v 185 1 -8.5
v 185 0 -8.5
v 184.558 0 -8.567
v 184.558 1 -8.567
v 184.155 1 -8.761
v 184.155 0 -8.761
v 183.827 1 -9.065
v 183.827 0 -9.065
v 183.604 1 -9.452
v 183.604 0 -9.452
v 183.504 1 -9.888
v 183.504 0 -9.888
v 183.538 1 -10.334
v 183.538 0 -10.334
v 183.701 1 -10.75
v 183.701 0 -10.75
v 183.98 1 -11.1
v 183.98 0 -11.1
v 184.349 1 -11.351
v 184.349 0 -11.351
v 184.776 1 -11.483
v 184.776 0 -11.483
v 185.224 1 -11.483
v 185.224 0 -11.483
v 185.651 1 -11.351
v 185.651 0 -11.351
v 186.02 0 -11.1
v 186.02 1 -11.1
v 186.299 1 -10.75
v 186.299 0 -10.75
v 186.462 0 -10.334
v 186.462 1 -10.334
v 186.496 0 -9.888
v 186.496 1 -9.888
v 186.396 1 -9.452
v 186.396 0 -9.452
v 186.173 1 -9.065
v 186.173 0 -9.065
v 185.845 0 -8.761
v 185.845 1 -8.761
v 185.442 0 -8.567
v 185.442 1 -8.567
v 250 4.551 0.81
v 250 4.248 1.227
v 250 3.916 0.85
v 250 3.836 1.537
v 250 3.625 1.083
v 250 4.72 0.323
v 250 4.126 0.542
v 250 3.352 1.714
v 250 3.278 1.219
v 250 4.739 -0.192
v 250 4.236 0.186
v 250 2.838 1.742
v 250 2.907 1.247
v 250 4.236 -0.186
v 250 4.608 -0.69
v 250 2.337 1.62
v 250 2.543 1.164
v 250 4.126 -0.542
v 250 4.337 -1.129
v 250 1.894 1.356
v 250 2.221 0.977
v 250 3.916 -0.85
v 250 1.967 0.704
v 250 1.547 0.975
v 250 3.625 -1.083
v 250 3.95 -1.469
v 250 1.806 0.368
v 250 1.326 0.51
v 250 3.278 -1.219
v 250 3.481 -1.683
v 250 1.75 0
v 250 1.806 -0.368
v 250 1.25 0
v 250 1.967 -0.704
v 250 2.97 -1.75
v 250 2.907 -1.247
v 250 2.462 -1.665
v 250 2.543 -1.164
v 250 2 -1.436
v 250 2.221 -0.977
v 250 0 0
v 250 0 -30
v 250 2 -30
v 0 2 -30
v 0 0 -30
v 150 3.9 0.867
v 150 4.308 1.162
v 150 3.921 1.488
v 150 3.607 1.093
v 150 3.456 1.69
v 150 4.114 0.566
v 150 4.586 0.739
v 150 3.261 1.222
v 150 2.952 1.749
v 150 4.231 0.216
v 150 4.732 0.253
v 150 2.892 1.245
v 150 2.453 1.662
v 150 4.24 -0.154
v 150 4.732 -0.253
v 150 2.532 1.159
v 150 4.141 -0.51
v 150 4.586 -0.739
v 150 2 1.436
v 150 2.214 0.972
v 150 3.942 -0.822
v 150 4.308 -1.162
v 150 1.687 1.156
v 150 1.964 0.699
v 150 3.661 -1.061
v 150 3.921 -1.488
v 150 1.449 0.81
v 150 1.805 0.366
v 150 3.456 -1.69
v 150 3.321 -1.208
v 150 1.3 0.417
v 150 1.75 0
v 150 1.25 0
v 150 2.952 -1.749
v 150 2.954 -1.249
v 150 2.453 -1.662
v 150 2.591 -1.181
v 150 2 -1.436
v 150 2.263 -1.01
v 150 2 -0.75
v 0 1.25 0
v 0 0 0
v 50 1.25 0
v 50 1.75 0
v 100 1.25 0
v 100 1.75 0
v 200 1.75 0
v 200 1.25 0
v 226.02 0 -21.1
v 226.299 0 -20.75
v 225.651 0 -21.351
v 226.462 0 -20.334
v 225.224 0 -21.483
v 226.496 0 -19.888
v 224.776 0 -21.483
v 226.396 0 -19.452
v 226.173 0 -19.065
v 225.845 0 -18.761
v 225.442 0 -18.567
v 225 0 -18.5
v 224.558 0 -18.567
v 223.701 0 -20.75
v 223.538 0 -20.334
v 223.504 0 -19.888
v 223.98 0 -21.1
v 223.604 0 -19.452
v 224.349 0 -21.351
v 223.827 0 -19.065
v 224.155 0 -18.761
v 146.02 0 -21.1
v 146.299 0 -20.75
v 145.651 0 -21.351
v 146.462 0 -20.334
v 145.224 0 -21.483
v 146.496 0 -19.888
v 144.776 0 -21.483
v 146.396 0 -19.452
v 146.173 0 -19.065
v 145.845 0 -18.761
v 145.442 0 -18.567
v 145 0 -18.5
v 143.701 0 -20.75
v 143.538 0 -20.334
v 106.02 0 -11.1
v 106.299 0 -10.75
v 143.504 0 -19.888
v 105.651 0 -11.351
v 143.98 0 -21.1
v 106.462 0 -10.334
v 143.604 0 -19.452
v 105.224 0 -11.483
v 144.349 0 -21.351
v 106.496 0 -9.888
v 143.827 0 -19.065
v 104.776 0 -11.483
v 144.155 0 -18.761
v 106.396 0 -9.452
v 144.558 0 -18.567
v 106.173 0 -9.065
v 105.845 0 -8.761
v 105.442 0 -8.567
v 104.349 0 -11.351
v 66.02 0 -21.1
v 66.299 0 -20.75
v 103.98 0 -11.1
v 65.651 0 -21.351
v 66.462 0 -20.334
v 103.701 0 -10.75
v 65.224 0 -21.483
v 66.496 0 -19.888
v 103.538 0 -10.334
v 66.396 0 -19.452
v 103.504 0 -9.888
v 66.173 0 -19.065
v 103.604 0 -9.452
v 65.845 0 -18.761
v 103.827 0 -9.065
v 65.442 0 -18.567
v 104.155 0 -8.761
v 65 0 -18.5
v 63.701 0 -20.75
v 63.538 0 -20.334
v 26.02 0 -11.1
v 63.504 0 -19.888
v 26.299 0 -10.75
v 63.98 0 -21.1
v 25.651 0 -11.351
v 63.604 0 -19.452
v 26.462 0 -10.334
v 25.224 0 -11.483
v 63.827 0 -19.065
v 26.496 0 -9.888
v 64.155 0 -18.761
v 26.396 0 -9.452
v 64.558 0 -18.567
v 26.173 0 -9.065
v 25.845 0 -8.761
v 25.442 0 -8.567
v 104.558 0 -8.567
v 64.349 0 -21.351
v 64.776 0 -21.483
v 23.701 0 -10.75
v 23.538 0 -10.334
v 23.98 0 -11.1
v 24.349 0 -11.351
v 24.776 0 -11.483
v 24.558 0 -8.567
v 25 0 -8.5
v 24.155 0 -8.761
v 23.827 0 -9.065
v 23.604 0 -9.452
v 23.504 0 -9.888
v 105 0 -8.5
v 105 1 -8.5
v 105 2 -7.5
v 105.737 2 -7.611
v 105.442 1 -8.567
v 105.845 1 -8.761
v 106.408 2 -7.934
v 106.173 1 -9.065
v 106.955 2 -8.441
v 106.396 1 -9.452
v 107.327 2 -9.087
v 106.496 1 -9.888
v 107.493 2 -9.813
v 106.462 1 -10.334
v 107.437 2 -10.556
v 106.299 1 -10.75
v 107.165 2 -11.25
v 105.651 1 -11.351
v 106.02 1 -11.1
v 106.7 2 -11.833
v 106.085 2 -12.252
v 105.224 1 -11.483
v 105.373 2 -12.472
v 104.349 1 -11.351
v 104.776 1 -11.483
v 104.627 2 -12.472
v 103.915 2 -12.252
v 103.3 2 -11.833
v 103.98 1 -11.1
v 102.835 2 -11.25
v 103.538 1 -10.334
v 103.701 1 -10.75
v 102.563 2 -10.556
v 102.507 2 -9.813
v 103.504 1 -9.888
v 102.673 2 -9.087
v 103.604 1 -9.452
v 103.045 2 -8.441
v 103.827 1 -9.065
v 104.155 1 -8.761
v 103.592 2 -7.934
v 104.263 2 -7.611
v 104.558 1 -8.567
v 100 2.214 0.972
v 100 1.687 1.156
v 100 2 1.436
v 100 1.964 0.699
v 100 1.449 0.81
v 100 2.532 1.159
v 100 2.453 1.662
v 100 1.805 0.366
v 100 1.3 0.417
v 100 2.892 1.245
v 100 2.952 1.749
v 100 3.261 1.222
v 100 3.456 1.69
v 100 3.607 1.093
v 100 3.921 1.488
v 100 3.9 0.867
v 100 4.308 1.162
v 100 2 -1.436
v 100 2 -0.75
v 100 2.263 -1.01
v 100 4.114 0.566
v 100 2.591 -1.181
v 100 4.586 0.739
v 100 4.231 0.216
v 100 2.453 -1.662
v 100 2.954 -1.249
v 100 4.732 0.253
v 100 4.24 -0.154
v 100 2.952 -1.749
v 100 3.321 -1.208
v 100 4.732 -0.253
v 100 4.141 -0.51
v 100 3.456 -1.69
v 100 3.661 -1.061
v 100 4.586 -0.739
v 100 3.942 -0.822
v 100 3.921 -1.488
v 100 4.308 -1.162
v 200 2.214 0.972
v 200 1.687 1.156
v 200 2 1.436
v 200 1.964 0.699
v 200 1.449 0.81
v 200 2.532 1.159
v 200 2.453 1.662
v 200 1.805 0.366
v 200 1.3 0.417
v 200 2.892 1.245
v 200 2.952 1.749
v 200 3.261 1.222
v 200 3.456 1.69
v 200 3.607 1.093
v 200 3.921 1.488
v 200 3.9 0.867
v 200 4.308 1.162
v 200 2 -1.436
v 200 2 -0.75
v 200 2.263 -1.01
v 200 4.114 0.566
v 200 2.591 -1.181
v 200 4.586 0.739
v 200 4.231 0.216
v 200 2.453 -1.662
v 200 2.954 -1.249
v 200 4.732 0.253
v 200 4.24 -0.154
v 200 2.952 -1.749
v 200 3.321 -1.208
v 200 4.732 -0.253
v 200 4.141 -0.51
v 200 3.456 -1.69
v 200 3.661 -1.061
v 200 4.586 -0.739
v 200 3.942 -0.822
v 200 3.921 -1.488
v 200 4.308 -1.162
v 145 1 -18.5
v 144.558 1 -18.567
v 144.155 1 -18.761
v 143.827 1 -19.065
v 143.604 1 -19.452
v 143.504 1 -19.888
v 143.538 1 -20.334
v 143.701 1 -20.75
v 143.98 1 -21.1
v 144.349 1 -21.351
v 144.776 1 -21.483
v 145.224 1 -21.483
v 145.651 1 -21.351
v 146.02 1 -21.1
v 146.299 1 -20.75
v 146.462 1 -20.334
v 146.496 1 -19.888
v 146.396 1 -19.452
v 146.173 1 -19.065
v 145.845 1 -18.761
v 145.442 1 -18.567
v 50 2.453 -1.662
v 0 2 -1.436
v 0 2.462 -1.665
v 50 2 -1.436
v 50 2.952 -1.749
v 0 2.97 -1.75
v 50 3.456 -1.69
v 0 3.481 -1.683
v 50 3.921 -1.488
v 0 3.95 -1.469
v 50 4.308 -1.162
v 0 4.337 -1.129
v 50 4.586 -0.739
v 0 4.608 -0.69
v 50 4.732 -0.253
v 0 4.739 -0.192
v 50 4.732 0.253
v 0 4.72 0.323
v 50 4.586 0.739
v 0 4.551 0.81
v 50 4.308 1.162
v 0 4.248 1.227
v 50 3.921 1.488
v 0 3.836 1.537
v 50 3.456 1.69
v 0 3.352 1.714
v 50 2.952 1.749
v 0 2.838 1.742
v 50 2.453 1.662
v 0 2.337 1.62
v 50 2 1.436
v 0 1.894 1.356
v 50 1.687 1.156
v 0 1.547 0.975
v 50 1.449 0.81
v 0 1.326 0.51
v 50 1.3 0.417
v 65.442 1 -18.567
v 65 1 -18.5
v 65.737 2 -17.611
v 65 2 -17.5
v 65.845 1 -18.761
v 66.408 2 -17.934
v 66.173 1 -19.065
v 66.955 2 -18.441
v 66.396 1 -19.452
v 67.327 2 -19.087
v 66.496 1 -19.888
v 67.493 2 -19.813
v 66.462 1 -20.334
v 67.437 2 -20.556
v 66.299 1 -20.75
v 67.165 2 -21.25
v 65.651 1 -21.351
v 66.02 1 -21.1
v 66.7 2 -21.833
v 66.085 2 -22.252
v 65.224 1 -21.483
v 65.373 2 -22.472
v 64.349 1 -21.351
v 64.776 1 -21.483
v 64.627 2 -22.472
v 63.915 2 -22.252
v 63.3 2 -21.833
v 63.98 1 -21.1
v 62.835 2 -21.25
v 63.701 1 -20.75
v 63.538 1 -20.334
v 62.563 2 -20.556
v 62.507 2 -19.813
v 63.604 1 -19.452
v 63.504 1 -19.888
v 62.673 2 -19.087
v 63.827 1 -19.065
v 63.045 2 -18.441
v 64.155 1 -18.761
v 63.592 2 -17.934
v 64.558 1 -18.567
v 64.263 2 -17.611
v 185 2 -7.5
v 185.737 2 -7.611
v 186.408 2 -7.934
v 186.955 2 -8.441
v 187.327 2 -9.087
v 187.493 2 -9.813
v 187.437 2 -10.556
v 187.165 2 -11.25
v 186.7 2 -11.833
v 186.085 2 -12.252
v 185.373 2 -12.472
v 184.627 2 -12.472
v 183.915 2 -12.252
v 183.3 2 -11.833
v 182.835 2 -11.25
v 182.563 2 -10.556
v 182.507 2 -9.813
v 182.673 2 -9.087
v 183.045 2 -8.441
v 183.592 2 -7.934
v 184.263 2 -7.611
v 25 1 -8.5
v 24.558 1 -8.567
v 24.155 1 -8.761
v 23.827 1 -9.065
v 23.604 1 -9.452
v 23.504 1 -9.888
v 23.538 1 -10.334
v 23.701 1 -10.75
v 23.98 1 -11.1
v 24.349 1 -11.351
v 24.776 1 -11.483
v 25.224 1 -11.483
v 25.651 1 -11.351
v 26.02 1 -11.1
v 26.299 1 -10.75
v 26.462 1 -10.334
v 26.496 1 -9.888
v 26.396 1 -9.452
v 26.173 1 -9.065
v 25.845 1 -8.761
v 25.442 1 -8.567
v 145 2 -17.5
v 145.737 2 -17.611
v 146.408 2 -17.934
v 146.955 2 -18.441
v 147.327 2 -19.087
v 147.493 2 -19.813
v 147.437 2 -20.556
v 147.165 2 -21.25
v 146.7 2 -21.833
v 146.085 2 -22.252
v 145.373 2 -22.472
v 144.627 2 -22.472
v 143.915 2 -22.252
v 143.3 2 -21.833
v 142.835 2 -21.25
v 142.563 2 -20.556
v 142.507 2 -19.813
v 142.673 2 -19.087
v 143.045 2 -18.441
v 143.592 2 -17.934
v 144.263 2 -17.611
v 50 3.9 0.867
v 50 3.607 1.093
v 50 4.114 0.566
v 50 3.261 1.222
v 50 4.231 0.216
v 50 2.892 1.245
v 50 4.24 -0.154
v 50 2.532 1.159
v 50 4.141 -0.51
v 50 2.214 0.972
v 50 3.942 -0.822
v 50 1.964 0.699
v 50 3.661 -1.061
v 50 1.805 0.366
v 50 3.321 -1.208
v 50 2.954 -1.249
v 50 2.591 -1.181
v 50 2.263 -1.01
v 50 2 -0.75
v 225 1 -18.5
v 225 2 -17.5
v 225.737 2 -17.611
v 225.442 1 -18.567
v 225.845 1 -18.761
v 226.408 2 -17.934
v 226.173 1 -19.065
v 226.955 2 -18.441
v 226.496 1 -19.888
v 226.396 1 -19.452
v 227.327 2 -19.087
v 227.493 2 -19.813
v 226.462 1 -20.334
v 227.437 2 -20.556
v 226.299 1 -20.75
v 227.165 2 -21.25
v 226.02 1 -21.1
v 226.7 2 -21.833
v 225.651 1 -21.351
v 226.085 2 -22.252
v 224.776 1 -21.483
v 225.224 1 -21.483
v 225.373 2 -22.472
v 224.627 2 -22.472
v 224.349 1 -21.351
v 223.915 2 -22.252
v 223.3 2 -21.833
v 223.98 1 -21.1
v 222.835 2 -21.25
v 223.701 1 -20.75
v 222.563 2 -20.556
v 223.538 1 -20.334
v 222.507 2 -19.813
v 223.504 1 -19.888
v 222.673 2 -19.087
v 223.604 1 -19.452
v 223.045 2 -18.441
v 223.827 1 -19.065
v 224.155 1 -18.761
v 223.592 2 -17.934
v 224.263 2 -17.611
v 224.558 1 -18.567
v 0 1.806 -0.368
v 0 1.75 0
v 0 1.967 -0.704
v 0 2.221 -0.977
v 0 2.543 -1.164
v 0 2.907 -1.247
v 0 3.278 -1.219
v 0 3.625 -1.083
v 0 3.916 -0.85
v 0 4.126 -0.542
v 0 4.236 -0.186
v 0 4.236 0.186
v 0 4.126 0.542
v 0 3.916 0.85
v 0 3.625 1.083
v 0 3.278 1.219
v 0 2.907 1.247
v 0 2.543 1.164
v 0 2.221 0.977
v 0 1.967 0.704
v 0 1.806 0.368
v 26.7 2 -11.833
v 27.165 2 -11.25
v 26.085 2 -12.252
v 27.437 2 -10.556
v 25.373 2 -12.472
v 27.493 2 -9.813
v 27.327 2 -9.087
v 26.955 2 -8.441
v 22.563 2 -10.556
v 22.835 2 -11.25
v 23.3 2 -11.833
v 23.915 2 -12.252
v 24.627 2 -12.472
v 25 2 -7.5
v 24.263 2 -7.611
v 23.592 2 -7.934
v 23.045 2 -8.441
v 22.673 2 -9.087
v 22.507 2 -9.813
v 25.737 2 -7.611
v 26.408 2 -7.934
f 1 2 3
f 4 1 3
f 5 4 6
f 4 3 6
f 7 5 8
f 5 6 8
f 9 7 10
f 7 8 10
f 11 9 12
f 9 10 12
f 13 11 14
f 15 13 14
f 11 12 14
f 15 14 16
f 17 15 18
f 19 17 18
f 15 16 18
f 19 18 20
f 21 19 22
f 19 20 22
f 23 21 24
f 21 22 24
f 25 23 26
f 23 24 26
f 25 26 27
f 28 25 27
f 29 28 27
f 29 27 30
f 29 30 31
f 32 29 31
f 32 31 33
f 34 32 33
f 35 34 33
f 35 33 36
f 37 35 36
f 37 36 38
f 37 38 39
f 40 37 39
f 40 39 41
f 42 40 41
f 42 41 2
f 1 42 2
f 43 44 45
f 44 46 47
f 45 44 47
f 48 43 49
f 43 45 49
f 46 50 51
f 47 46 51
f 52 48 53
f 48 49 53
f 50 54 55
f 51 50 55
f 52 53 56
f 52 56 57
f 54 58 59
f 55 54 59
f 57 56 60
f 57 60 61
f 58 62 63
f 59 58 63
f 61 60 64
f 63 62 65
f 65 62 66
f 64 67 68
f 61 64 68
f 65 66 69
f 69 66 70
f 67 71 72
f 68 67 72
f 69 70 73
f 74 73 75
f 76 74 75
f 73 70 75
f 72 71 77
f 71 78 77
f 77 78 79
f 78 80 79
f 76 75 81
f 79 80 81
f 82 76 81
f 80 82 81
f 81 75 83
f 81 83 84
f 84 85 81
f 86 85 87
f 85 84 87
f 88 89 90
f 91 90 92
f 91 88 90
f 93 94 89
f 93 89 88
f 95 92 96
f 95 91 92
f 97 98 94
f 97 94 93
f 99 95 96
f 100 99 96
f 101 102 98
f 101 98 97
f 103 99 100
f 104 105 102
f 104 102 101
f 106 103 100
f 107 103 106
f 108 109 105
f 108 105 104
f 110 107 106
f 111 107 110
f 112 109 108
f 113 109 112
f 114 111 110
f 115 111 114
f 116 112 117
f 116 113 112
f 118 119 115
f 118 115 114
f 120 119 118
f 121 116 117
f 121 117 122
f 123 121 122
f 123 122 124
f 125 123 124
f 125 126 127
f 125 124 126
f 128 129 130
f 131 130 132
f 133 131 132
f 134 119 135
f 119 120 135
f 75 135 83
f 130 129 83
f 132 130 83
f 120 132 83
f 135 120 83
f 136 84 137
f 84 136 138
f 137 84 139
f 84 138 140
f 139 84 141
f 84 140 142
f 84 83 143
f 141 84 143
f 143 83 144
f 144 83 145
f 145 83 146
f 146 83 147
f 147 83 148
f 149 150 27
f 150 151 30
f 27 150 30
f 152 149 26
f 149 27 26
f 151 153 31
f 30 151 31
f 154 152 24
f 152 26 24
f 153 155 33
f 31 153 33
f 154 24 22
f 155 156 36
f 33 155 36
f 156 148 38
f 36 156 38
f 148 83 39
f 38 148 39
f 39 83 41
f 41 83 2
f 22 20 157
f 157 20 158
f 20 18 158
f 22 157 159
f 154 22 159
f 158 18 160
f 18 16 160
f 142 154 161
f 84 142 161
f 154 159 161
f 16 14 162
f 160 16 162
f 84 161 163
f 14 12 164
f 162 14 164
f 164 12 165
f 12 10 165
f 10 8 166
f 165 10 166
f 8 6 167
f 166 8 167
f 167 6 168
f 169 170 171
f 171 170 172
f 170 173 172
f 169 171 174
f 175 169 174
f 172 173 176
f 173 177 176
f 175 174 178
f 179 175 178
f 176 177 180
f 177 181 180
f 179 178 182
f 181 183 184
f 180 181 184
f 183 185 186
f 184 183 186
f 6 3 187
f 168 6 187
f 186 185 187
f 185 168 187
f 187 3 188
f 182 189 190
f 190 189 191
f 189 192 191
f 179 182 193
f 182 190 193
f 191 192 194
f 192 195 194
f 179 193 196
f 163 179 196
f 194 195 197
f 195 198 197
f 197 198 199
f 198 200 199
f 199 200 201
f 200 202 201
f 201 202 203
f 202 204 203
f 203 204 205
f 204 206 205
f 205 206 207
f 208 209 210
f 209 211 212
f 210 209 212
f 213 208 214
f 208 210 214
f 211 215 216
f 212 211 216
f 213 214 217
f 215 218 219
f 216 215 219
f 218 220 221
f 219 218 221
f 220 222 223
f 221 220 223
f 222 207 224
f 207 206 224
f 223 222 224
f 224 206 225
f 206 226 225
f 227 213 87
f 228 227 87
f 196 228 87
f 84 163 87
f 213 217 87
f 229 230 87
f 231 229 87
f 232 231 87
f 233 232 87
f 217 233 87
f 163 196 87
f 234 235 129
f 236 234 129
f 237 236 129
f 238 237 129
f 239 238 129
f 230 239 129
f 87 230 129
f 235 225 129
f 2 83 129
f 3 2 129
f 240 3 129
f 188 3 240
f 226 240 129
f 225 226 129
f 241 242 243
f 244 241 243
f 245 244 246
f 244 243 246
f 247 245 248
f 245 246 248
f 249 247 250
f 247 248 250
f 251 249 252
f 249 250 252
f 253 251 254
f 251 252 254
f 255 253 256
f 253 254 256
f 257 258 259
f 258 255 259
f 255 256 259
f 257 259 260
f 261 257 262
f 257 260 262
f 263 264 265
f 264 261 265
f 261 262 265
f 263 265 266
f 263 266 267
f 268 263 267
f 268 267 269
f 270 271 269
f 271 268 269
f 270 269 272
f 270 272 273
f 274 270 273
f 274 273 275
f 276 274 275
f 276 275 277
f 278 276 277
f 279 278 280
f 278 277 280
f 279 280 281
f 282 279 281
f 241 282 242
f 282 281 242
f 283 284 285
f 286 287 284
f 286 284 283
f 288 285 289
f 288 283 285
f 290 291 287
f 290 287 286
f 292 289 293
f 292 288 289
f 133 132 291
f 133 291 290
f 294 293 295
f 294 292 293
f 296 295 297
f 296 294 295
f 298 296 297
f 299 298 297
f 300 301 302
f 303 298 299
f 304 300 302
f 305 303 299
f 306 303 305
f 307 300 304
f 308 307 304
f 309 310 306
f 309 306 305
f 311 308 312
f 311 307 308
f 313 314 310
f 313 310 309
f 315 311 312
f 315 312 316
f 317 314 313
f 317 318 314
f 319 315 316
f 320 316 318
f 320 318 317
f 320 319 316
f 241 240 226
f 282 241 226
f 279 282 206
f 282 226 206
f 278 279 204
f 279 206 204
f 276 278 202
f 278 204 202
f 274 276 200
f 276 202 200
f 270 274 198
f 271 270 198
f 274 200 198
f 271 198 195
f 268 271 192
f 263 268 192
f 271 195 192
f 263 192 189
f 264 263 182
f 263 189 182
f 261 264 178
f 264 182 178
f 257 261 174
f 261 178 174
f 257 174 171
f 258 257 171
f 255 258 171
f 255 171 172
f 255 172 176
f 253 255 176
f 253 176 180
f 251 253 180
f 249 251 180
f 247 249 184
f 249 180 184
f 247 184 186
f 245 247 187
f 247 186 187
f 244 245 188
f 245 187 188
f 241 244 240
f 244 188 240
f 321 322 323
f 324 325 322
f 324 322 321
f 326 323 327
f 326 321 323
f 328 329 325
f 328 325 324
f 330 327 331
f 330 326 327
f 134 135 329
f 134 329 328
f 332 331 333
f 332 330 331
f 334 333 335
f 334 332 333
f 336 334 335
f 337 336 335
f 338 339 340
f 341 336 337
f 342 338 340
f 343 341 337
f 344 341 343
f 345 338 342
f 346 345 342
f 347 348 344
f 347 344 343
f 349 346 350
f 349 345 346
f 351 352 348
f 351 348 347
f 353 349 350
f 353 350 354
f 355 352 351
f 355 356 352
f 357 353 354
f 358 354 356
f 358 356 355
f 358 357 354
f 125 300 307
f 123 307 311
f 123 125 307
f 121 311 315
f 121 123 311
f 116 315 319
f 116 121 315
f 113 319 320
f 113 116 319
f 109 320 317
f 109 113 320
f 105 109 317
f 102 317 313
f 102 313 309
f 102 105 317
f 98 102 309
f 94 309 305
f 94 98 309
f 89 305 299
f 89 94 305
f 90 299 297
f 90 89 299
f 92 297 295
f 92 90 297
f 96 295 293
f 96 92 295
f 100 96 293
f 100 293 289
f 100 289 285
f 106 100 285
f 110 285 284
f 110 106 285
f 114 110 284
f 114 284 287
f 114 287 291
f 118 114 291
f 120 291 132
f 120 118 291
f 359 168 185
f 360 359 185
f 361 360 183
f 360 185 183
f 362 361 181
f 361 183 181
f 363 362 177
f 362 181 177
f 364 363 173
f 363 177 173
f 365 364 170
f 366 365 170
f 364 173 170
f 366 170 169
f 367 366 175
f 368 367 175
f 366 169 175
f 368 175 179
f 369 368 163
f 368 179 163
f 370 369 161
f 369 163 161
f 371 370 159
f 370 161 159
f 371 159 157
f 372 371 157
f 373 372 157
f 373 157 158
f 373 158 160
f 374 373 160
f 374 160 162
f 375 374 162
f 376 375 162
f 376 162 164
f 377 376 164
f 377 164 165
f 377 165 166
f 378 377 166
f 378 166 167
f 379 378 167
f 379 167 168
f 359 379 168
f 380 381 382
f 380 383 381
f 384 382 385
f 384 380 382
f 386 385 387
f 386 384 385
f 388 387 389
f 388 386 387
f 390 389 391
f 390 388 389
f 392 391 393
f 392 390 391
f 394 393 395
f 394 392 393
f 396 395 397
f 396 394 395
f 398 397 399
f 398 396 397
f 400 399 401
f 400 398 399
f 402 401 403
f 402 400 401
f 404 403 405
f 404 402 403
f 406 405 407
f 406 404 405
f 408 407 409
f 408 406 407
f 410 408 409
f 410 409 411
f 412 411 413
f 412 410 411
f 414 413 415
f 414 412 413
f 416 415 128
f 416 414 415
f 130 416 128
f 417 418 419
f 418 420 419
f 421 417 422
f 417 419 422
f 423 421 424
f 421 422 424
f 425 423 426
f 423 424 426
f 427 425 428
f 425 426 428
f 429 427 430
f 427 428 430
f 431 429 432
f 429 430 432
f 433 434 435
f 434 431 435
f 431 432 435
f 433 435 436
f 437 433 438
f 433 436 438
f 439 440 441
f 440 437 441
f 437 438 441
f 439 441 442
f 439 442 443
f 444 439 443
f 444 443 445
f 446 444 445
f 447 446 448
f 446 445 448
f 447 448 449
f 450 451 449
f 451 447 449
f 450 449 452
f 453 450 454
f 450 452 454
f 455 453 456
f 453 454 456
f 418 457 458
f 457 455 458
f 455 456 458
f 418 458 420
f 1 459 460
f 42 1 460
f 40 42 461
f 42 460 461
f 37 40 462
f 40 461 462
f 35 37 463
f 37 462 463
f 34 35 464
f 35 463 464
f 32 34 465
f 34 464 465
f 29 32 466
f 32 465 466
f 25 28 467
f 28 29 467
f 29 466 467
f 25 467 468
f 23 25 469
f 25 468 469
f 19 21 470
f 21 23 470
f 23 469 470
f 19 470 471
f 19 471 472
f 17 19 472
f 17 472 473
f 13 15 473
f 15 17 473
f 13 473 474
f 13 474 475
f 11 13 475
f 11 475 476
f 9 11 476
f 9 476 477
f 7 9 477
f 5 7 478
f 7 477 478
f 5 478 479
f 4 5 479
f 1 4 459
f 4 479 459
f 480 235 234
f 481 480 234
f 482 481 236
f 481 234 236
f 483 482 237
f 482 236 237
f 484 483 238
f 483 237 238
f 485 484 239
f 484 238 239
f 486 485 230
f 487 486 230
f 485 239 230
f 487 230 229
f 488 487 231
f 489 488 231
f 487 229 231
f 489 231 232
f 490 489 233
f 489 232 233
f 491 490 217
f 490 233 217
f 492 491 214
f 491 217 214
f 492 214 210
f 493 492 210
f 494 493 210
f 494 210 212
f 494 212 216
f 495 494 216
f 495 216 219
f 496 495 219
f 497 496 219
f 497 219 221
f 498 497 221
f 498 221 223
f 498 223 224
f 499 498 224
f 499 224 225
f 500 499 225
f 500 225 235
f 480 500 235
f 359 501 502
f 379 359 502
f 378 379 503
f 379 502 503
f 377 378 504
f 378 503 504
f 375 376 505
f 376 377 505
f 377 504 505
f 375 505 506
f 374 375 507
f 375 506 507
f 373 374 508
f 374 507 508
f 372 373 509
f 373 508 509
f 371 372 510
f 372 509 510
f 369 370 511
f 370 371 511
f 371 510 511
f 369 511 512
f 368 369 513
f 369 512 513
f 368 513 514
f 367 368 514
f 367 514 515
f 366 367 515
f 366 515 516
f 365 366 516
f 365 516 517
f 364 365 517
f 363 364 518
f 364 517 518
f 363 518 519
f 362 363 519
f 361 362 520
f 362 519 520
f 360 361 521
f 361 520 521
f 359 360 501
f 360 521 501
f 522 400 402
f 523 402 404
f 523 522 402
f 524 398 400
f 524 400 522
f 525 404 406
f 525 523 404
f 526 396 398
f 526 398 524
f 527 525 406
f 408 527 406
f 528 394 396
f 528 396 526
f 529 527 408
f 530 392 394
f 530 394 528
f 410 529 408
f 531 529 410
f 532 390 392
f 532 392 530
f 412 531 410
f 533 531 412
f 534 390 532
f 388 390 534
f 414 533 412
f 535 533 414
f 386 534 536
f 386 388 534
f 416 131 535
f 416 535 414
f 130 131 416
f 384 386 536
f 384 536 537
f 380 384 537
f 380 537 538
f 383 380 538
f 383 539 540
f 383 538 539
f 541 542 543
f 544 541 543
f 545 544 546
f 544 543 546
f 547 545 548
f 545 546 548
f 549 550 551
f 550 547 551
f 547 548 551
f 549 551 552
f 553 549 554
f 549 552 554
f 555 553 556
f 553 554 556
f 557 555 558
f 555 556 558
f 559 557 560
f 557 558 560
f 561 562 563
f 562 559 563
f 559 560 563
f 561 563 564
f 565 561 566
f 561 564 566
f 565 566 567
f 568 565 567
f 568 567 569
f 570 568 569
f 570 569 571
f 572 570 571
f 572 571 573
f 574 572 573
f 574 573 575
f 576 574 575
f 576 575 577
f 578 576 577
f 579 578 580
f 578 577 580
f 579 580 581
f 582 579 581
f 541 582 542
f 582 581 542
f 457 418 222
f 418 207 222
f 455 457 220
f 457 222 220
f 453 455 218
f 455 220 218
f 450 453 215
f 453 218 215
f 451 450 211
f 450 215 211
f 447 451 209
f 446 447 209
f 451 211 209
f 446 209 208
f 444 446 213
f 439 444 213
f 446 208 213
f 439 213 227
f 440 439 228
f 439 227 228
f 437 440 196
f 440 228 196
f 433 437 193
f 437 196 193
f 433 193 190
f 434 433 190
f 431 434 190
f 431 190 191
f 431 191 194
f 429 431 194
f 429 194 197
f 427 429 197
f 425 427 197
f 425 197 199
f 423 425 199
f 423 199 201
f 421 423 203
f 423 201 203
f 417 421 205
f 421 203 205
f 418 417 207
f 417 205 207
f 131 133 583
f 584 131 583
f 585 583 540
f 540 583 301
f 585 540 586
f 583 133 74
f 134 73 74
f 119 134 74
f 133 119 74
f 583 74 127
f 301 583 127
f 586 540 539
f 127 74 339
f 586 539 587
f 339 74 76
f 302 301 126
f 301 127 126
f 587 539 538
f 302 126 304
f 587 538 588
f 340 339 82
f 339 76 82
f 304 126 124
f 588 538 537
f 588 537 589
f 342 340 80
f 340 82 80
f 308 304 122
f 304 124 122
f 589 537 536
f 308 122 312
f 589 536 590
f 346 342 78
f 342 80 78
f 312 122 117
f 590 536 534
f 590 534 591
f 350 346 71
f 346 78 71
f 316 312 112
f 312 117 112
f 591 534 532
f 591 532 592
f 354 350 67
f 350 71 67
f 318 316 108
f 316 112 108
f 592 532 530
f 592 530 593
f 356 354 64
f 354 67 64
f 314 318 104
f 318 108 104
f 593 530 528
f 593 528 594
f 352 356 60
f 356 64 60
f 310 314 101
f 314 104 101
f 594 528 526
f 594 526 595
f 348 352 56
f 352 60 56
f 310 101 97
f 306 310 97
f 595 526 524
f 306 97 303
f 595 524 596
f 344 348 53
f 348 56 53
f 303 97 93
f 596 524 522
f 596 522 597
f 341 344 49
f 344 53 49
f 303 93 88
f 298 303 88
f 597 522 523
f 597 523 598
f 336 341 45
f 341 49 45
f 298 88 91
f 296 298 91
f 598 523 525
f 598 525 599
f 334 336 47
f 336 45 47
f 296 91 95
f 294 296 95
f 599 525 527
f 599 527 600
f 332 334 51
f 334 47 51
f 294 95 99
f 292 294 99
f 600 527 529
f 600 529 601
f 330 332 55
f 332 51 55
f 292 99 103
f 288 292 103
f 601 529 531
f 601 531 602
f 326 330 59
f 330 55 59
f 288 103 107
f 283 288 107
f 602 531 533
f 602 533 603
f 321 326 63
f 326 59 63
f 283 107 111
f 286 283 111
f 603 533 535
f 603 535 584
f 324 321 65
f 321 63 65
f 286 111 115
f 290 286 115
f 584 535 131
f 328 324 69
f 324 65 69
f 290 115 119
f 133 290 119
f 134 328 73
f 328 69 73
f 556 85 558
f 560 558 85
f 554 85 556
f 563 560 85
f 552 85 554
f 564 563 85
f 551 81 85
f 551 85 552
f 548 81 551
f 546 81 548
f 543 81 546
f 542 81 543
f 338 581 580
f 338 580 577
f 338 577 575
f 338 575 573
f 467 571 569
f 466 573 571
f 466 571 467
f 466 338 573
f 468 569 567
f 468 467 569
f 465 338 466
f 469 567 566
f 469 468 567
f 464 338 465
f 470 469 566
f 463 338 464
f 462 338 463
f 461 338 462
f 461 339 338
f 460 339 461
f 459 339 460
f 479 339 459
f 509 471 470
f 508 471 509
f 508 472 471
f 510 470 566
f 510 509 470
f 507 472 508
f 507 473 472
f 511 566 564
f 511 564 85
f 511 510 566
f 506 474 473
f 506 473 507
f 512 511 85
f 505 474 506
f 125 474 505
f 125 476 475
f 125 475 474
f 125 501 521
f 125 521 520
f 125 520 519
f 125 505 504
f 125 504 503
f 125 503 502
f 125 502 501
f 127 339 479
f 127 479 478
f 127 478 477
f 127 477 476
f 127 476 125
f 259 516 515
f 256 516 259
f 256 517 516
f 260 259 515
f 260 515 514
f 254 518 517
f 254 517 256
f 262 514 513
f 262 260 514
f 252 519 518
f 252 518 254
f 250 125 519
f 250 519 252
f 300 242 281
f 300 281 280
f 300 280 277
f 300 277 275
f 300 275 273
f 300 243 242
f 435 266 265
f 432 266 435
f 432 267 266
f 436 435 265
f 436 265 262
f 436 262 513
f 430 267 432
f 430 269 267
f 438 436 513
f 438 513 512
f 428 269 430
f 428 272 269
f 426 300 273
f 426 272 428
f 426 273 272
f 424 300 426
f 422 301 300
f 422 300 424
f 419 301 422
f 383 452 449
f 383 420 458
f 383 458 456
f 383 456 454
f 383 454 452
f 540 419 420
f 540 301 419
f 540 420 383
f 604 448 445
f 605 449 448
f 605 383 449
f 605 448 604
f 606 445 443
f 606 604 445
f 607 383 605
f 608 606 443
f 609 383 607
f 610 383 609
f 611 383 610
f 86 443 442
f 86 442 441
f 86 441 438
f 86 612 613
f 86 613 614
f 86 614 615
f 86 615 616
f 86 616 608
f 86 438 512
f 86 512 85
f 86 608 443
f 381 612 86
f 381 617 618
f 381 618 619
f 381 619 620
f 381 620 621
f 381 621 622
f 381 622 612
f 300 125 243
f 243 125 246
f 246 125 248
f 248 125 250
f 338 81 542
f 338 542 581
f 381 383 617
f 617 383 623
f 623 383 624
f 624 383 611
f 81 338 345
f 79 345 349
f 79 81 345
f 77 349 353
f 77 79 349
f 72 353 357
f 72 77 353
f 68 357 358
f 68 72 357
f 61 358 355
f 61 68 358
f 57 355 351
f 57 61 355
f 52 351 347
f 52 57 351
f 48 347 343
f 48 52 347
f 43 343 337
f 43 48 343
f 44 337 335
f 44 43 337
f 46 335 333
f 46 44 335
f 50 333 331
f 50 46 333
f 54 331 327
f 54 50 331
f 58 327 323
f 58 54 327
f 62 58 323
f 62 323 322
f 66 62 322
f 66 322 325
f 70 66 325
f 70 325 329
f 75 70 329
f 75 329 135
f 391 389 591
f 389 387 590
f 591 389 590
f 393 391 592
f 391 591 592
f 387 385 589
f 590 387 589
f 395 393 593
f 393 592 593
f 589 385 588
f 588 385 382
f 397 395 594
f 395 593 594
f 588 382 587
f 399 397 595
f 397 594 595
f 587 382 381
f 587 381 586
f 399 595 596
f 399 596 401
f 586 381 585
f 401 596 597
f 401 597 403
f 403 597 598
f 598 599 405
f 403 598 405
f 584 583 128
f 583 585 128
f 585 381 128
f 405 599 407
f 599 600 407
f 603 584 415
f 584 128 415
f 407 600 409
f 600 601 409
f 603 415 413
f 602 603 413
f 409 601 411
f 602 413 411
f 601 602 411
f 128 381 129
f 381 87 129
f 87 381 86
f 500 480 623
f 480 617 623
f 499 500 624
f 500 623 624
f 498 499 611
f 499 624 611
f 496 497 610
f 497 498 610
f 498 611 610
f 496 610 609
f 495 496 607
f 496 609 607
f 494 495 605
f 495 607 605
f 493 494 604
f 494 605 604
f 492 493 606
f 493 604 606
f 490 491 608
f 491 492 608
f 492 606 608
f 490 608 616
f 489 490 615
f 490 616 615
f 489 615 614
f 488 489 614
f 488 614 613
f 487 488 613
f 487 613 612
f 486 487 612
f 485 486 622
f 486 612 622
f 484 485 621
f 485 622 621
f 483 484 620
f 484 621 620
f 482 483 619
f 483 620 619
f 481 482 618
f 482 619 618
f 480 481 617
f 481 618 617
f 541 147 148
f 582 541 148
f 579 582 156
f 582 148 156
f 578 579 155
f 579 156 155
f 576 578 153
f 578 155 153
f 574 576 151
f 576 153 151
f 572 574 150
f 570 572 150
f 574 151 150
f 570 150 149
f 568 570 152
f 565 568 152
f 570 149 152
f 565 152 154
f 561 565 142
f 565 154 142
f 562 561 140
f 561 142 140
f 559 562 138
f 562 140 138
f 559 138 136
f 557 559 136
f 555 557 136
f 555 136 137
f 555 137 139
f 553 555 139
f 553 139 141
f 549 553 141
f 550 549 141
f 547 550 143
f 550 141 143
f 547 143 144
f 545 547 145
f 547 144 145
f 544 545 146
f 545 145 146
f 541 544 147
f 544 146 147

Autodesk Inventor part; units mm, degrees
ref_plane "YZ Plane" through (0, 0, 0) normal (1, 0, 0) x (0, 1, 0)
ref_plane "XZ Plane" through (0, 0, 0) normal (0, 1, 0) x (-1, 0, 0)
sketch "Sketch1" plane through (0, 0, 0) normal (0, 1, 0) x (-1, 0, 0)
  line L0 (0, 0) -> (-250, 0)
  line L1 (-250, 0) -> (-250, -30)
  line L2 (-250, -30) -> (0, -30)
  line L3 (0, -30) -> (0, 0)
  dimension "d0" = 250
  dimension "d1" = 30
extrude "Extrusion1" add sketch "Sketch1" along normal blind 2
sketch "Sketch2" plane through (250, 0, 0) normal (1, 0, 0) x (0, 0, -1)
  circle A0 centre (0, 3) radius 1.25
  circle A1 centre (0, 3) radius 1.75
  point P0 (0, 0)
  dimension "d4" = 2.5
  dimension "d5" = 3
  dimension "d6" = 3.5
extrude "Extrusion2" add sketch "Sketch2" against normal blind 250
extrude "Extrusion3" cut sketch "Sketch2" against normal blind 250 contours A0
sketch "Sketch3" plane through (250, 0, -30) normal (0, 0, -1) x (-1, 0, 0)
  line L0 (50, 4.75) -> (100, 4.75)
  line L1 (100, 4.75) -> (100, 2)
  line L2 (100, 2) -> (50, 2)
  line L3 (50, 2) -> (50, 4.75)
  line L4 (150, 4.75) -> (200, 4.75)
  line L5 (200, 4.75) -> (200, 2)
  line L6 (200, 2) -> (150, 2)
  line L7 (150, 2) -> (150, 4.75)
  point P0 (0, 2)
  point P1 (75, 2)
  point P2 (175, 2)
  point P3 (250, 2)
  dimension "d38" = 50
  dimension "d39" = 2.75
  dimension "d40" = 50
  dimension "d41" = 2.75
  dimension "d42" = 50
  dimension "d43" = 50
ref_plane "Work Plane1" through (200, 2, 1.4361) normal (0, 1, 0) x (1, 0, 0)
sketch "Sketch5" plane through (0, 2, 0) normal (0, 1, 0) x (1, 0, 0)
  line L0 (100, 1.75) -> (100, -1.75) projected
  line L1 (0, 0) -> (50, 0) projected
  point P0 (25, 10)
  point P1 (65, 20)
  point P2 (105, 10)
  point P3 (145, 20)
  point P4 (185, 10)
  point P5 (225, 20)
  point P6 (100, 0)
  point P7 (100, 1.4361)
  dimension "d23" = 40
  dimension "d24" = 5
  dimension "d25" = 40
  dimension "d26" = 40
  dimension "d27" = 40
  dimension "d28" = 40
  dimension "d29" = 10
  dimension "d30" = 10
hole "Hole1" at (25, 2, -10) at (65, 2, -20) at (105, 2, -10) at (145, 2, -20) at (185, 2, -10) at (225, 2, -20) direction (0, -1, 0) diameter 3 end through all countersink diameter 5 countersink angle 90
extrude "Extrusion6" cut sketch "Sketch3" against normal through all
sketch "Sketch6" plane through (150, 2, 1.4361) normal (0, 1, 0) x (1, 0, 0)
  line L0 (-50, 0) -> (-100, 0) projected
  line L1 (-50, 2.6861) -> (-50, 0.1861) projected
  line L2 (-100, 0) -> (-50, 0)
  line L3 (-50, 0) -> (-50, 1.4361)
  line L4 (-50, 1.4361) -> (-100, 1.4361)
  line L5 (-100, 1.4361) -> (-100, 0)
  line L6 (0, 0.6861) -> (0, 0) projected
  line L7 (50, 2.6861) -> (50, 0.1861) projected
  line L8 (0, 0) -> (50, 0)
  line L9 (50, 0) -> (50, 1.4361)
  line L10 (50, 1.4361) -> (0, 1.4361)
  line L11 (0, 1.4361) -> (0, 0)
  point P0 (-150, 1.4361)
  point P1 (-50, 0.6861)
  point P2 (-50, 2.1861)
  point P3 (50, 0.6861)
  point P4 (50, 2.1861)
extrude "Extrusion7" cut sketch "Sketch6" against normal through all
equation "\"d40\" = d38"
equation "\"d42\" = d38"
equation "\"d43\" = d38"
equation "\"d25\" = d23"
equation "\"d26\" = d23"
equation "\"d27\" = d23"
equation "\"d28\" = d23"
properties part number "Hinge 2 of 2" material "Steel"
